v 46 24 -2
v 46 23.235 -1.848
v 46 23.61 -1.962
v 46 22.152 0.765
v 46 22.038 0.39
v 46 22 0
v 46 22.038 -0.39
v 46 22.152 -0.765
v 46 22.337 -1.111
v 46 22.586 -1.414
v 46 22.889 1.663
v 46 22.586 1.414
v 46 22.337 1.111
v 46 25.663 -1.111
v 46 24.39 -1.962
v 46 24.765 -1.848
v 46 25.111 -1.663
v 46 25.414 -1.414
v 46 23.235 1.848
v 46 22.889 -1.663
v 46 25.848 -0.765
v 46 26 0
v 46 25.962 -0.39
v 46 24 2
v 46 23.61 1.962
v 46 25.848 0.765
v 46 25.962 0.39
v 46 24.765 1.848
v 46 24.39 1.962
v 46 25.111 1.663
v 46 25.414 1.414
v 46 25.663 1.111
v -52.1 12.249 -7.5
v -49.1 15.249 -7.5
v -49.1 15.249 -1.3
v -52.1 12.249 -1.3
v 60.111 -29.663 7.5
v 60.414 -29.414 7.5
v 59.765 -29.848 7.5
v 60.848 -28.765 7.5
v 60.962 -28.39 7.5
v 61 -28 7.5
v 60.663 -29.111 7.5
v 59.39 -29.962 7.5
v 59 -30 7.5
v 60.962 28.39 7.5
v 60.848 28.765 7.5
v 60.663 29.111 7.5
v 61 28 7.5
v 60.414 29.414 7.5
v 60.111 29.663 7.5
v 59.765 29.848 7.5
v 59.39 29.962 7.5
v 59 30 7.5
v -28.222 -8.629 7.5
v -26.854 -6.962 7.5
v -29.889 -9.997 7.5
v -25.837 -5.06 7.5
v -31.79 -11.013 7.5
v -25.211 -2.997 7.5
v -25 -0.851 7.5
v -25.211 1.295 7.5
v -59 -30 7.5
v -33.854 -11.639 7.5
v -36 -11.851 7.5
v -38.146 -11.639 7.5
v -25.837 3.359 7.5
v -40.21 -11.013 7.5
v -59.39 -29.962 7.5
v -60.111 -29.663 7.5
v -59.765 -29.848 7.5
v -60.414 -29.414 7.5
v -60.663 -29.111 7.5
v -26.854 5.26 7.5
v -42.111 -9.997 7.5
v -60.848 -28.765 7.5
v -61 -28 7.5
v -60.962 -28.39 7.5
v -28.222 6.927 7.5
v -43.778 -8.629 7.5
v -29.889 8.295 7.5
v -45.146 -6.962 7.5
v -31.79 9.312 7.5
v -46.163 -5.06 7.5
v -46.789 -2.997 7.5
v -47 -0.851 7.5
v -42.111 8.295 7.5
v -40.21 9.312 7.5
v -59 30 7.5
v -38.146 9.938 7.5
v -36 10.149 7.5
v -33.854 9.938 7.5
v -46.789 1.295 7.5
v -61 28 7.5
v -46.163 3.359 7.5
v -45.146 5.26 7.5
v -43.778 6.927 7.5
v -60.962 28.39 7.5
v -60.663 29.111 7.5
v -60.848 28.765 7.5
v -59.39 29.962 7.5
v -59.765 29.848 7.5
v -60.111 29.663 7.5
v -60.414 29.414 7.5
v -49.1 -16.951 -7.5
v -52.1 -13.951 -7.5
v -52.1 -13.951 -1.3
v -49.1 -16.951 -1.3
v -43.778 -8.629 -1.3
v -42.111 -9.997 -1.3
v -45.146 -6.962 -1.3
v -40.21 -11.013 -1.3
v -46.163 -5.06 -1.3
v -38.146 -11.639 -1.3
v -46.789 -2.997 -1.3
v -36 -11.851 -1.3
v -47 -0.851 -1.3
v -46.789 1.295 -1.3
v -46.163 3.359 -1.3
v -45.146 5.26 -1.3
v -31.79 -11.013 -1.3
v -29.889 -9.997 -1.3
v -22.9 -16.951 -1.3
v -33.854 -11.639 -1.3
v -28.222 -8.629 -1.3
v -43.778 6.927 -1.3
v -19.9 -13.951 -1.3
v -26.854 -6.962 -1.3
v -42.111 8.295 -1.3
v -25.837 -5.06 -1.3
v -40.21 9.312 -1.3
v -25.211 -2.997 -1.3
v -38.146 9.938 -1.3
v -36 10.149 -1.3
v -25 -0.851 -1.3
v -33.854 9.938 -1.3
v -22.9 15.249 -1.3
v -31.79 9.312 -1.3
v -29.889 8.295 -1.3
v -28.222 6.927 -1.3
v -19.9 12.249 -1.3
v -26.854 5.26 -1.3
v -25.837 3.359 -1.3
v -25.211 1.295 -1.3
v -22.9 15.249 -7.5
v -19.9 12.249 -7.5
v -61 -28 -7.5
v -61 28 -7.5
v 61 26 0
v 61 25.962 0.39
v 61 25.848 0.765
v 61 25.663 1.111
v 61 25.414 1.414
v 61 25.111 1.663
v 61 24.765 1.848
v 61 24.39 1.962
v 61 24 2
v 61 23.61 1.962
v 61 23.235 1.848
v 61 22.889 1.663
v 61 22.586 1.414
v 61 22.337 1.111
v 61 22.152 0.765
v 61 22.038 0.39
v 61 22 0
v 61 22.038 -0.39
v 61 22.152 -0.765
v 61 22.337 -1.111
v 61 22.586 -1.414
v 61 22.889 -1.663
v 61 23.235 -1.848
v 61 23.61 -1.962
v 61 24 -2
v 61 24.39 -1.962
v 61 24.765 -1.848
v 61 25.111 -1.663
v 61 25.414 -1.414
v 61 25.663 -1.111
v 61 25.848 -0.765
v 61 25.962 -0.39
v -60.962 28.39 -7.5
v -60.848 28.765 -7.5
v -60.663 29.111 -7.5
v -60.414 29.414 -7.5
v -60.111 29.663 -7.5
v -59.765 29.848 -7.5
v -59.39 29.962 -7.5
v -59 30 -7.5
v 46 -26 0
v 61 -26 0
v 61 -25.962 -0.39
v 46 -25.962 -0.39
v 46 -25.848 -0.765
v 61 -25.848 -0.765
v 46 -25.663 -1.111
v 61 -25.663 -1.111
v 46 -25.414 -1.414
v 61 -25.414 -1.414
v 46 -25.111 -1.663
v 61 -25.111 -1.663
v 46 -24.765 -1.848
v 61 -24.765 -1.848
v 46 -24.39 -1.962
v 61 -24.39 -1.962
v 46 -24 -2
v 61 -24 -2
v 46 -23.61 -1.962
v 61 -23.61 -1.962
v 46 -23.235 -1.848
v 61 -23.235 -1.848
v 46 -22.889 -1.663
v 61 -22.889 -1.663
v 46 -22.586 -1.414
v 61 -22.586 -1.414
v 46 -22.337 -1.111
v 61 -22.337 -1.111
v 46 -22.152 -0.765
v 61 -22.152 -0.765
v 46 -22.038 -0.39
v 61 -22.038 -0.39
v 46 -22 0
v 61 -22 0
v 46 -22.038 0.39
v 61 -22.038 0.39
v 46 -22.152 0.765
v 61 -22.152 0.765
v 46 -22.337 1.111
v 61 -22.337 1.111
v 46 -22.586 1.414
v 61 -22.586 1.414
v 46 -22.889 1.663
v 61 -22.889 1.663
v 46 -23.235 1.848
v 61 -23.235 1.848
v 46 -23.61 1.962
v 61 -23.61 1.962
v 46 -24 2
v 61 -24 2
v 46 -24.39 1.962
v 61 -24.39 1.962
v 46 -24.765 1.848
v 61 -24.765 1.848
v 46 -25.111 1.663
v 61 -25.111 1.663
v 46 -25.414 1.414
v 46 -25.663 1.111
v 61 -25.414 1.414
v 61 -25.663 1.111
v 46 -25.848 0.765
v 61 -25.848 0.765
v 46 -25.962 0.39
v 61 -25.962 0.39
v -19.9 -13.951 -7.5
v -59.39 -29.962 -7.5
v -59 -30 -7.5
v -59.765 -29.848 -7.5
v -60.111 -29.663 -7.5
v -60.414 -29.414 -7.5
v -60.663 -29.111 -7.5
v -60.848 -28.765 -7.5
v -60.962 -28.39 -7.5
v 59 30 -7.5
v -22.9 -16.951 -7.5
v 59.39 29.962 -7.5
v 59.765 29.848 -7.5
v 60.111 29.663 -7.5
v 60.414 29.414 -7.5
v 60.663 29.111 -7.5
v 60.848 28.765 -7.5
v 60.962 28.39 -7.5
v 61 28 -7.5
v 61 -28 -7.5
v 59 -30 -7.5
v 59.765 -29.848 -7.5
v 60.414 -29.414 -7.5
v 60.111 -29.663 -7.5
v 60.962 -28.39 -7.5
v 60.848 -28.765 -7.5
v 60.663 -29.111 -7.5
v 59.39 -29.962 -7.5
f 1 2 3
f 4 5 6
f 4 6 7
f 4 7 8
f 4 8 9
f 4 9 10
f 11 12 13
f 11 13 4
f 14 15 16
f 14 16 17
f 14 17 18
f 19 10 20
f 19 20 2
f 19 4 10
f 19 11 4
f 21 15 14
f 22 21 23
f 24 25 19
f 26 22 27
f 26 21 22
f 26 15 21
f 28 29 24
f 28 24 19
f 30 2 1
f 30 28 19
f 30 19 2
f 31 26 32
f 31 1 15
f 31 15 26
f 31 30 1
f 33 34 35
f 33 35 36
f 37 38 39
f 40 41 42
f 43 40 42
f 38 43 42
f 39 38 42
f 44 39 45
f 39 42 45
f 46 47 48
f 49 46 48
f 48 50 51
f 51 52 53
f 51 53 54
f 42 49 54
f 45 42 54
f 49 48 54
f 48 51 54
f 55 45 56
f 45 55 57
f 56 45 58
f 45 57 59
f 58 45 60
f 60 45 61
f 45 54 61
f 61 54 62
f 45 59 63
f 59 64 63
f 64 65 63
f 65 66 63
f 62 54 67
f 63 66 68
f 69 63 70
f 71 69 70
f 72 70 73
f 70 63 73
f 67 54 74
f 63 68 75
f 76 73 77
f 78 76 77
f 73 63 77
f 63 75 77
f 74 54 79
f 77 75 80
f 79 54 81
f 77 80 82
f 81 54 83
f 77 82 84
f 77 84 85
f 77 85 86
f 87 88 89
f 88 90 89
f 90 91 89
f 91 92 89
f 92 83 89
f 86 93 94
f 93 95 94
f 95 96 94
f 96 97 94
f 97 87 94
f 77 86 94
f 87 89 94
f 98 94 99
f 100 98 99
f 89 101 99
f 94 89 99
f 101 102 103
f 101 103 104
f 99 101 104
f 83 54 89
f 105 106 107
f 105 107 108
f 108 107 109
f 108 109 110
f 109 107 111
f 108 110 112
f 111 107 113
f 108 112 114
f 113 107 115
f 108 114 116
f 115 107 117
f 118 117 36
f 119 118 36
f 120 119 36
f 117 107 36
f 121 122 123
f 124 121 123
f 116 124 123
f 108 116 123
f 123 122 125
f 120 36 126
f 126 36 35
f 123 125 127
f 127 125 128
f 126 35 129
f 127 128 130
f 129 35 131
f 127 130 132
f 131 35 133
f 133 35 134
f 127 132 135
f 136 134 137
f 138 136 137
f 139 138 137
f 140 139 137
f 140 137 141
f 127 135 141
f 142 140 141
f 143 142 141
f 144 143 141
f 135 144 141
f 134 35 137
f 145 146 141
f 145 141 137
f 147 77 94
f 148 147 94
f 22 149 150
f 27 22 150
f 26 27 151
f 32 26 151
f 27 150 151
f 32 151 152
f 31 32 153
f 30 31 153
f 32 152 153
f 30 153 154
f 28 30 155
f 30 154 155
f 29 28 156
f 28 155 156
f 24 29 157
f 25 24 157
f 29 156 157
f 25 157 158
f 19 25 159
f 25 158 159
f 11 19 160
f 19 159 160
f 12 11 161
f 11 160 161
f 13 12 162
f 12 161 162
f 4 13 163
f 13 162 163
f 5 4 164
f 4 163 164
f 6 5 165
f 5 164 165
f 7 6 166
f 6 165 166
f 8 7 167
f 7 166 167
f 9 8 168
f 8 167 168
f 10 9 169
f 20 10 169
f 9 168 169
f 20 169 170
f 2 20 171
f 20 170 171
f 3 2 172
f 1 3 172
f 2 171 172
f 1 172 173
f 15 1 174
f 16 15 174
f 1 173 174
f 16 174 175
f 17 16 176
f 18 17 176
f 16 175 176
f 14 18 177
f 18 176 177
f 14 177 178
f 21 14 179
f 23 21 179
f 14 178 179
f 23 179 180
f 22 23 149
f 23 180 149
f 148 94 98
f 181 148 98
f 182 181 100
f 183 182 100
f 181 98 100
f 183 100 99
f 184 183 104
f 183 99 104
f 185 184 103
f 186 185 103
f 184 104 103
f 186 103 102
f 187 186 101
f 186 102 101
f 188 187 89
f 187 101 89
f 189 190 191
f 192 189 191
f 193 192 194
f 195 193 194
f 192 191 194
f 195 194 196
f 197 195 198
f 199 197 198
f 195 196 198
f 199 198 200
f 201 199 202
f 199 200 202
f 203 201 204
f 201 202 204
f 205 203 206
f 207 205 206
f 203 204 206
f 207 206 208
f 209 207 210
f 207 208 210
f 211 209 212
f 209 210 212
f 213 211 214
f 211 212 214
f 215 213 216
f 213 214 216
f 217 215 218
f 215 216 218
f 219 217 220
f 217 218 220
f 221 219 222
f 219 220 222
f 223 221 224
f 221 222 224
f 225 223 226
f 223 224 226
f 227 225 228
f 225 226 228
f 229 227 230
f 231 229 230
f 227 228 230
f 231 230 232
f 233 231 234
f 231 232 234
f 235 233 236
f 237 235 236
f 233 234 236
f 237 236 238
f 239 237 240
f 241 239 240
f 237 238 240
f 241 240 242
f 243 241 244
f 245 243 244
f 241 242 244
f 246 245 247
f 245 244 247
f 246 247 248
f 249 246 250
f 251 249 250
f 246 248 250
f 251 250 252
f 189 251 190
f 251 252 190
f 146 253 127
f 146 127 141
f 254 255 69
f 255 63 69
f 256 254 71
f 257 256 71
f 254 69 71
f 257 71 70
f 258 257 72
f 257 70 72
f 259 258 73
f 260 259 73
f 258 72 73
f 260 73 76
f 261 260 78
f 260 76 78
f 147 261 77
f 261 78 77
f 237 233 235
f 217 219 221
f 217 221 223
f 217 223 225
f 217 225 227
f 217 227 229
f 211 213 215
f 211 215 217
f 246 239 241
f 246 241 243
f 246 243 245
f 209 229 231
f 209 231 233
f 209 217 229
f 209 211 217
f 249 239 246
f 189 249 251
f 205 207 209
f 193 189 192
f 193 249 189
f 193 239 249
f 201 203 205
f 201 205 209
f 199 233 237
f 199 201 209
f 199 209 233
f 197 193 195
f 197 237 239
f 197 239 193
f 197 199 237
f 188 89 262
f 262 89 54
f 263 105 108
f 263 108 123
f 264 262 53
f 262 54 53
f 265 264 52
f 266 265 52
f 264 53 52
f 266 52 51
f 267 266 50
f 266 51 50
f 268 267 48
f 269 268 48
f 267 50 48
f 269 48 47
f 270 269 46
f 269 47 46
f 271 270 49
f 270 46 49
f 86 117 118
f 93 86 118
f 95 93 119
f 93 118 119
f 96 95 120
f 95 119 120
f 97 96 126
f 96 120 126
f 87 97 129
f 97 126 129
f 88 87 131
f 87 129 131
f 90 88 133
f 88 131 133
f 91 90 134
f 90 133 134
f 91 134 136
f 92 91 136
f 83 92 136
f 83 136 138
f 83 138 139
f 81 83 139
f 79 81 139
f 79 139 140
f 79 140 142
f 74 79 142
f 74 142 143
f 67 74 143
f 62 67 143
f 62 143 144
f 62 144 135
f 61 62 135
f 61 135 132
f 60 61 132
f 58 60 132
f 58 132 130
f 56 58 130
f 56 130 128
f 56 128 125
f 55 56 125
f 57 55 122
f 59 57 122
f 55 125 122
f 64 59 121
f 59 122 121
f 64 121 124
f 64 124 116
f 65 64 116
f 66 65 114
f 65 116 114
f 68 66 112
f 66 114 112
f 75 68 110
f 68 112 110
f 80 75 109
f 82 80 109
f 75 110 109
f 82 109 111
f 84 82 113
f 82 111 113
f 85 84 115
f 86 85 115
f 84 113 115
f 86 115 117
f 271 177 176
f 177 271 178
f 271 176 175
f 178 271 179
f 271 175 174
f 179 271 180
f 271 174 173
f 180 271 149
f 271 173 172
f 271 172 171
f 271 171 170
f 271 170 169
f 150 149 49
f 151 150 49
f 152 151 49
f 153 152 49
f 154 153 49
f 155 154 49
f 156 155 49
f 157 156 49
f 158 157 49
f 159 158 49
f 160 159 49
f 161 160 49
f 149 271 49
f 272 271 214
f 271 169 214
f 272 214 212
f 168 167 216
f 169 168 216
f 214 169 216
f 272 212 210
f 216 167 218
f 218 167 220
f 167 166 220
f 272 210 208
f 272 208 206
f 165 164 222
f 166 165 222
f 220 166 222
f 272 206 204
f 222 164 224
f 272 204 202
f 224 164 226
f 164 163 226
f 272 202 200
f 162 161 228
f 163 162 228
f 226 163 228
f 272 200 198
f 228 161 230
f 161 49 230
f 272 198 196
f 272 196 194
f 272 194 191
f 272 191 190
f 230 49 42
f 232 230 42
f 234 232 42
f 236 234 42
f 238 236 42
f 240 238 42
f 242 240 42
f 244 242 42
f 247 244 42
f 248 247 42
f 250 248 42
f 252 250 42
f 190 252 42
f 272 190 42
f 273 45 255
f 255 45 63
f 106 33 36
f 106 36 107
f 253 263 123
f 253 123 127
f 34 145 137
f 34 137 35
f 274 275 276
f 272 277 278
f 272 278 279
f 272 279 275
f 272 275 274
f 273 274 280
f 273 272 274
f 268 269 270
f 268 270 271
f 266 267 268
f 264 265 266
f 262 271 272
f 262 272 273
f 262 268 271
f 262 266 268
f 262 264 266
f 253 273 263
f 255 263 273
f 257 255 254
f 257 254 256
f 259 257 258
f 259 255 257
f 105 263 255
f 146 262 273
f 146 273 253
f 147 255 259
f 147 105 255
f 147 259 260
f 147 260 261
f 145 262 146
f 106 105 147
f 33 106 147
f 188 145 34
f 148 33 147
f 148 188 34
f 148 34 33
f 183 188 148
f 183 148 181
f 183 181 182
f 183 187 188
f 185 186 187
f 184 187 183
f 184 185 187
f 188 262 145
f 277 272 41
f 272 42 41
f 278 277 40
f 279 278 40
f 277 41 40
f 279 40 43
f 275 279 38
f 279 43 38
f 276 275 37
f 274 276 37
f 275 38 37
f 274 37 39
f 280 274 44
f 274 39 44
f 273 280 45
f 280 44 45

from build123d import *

# Parameters (mm, degrees)
BOSS_EXTRUDE1_DEPTH = 7.5
SKETCH2_R           = 2
CUT_EXTRUDE1_DEPTH  = 15
SKETCH3_R           = 11
CUT_EXTRUDE3_DEPTH  = 35
CUT_EXTRUDE5_DEPTH  = 6.2


with BuildPart() as part:
    # Sketch1 → Boss-Extrude1 (new, symmetric)
    with BuildSketch(Plane.XY):
        with BuildLine():
            Line((-59, 30), (59, 30))
            ThreePointArc((59, 30), (60.414213562, 29.414213562), (61, 28))
            Line((61, 28), (61, -28))
            ThreePointArc((61, -28), (60.414213562, -29.414213562), (59, -30))
            Line((59, -30), (-59, -30))
            ThreePointArc((-59, -30), (-60.414213562, -29.414213562), (-61, -28))
            Line((-61, -28), (-61, 28))
            ThreePointArc((-61, 28), (-60.414213562, 29.414213562), (-59, 30))
        make_face()
    extrude(amount=BOSS_EXTRUDE1_DEPTH, both=True)

    # Sketch2 → Cut-Extrude1 (cut)
    with BuildSketch(Plane(origin=(61, 0, 0), x_dir=(0, 0, -1), z_dir=(1, 0, 0))):
        with Locations(Location((0, 24, 0), (0, 0, 90))):
            Circle(SKETCH2_R)
        with Locations(Location((0, -24, 0), (0, 0, 270))):
            Circle(SKETCH2_R)
    extrude(amount=-CUT_EXTRUDE1_DEPTH, mode=Mode.SUBTRACT)

    # Sketch3 → Cut-Extrude3 (cut)
    with BuildSketch(Plane(origin=(0, 0, -7.5), x_dir=(-1, 0, 0), z_dir=(0, 0, -1))):
        with Locations((36, -0.850791996)):
            Circle(SKETCH3_R)
    extrude(amount=-CUT_EXTRUDE3_DEPTH, mode=Mode.SUBTRACT)

    # Sketch6 → Cut-Extrude5 (cut)
    with BuildSketch(Plane(origin=(0, 0, -7.5), x_dir=(-1, 0, 0), z_dir=(0, 0, -1))):
        Polygon((49.1, 15.249208004), (52.1, 12.249208004), (52.1, -13.950791996), (49.1, -16.950791996), (22.9, -16.950791996), (19.9, -13.950791996), (19.9, 12.249208004), (22.9, 15.249208004), align=None)
    extrude(amount=-CUT_EXTRUDE5_DEPTH, mode=Mode.SUBTRACT)


solid = part.part
